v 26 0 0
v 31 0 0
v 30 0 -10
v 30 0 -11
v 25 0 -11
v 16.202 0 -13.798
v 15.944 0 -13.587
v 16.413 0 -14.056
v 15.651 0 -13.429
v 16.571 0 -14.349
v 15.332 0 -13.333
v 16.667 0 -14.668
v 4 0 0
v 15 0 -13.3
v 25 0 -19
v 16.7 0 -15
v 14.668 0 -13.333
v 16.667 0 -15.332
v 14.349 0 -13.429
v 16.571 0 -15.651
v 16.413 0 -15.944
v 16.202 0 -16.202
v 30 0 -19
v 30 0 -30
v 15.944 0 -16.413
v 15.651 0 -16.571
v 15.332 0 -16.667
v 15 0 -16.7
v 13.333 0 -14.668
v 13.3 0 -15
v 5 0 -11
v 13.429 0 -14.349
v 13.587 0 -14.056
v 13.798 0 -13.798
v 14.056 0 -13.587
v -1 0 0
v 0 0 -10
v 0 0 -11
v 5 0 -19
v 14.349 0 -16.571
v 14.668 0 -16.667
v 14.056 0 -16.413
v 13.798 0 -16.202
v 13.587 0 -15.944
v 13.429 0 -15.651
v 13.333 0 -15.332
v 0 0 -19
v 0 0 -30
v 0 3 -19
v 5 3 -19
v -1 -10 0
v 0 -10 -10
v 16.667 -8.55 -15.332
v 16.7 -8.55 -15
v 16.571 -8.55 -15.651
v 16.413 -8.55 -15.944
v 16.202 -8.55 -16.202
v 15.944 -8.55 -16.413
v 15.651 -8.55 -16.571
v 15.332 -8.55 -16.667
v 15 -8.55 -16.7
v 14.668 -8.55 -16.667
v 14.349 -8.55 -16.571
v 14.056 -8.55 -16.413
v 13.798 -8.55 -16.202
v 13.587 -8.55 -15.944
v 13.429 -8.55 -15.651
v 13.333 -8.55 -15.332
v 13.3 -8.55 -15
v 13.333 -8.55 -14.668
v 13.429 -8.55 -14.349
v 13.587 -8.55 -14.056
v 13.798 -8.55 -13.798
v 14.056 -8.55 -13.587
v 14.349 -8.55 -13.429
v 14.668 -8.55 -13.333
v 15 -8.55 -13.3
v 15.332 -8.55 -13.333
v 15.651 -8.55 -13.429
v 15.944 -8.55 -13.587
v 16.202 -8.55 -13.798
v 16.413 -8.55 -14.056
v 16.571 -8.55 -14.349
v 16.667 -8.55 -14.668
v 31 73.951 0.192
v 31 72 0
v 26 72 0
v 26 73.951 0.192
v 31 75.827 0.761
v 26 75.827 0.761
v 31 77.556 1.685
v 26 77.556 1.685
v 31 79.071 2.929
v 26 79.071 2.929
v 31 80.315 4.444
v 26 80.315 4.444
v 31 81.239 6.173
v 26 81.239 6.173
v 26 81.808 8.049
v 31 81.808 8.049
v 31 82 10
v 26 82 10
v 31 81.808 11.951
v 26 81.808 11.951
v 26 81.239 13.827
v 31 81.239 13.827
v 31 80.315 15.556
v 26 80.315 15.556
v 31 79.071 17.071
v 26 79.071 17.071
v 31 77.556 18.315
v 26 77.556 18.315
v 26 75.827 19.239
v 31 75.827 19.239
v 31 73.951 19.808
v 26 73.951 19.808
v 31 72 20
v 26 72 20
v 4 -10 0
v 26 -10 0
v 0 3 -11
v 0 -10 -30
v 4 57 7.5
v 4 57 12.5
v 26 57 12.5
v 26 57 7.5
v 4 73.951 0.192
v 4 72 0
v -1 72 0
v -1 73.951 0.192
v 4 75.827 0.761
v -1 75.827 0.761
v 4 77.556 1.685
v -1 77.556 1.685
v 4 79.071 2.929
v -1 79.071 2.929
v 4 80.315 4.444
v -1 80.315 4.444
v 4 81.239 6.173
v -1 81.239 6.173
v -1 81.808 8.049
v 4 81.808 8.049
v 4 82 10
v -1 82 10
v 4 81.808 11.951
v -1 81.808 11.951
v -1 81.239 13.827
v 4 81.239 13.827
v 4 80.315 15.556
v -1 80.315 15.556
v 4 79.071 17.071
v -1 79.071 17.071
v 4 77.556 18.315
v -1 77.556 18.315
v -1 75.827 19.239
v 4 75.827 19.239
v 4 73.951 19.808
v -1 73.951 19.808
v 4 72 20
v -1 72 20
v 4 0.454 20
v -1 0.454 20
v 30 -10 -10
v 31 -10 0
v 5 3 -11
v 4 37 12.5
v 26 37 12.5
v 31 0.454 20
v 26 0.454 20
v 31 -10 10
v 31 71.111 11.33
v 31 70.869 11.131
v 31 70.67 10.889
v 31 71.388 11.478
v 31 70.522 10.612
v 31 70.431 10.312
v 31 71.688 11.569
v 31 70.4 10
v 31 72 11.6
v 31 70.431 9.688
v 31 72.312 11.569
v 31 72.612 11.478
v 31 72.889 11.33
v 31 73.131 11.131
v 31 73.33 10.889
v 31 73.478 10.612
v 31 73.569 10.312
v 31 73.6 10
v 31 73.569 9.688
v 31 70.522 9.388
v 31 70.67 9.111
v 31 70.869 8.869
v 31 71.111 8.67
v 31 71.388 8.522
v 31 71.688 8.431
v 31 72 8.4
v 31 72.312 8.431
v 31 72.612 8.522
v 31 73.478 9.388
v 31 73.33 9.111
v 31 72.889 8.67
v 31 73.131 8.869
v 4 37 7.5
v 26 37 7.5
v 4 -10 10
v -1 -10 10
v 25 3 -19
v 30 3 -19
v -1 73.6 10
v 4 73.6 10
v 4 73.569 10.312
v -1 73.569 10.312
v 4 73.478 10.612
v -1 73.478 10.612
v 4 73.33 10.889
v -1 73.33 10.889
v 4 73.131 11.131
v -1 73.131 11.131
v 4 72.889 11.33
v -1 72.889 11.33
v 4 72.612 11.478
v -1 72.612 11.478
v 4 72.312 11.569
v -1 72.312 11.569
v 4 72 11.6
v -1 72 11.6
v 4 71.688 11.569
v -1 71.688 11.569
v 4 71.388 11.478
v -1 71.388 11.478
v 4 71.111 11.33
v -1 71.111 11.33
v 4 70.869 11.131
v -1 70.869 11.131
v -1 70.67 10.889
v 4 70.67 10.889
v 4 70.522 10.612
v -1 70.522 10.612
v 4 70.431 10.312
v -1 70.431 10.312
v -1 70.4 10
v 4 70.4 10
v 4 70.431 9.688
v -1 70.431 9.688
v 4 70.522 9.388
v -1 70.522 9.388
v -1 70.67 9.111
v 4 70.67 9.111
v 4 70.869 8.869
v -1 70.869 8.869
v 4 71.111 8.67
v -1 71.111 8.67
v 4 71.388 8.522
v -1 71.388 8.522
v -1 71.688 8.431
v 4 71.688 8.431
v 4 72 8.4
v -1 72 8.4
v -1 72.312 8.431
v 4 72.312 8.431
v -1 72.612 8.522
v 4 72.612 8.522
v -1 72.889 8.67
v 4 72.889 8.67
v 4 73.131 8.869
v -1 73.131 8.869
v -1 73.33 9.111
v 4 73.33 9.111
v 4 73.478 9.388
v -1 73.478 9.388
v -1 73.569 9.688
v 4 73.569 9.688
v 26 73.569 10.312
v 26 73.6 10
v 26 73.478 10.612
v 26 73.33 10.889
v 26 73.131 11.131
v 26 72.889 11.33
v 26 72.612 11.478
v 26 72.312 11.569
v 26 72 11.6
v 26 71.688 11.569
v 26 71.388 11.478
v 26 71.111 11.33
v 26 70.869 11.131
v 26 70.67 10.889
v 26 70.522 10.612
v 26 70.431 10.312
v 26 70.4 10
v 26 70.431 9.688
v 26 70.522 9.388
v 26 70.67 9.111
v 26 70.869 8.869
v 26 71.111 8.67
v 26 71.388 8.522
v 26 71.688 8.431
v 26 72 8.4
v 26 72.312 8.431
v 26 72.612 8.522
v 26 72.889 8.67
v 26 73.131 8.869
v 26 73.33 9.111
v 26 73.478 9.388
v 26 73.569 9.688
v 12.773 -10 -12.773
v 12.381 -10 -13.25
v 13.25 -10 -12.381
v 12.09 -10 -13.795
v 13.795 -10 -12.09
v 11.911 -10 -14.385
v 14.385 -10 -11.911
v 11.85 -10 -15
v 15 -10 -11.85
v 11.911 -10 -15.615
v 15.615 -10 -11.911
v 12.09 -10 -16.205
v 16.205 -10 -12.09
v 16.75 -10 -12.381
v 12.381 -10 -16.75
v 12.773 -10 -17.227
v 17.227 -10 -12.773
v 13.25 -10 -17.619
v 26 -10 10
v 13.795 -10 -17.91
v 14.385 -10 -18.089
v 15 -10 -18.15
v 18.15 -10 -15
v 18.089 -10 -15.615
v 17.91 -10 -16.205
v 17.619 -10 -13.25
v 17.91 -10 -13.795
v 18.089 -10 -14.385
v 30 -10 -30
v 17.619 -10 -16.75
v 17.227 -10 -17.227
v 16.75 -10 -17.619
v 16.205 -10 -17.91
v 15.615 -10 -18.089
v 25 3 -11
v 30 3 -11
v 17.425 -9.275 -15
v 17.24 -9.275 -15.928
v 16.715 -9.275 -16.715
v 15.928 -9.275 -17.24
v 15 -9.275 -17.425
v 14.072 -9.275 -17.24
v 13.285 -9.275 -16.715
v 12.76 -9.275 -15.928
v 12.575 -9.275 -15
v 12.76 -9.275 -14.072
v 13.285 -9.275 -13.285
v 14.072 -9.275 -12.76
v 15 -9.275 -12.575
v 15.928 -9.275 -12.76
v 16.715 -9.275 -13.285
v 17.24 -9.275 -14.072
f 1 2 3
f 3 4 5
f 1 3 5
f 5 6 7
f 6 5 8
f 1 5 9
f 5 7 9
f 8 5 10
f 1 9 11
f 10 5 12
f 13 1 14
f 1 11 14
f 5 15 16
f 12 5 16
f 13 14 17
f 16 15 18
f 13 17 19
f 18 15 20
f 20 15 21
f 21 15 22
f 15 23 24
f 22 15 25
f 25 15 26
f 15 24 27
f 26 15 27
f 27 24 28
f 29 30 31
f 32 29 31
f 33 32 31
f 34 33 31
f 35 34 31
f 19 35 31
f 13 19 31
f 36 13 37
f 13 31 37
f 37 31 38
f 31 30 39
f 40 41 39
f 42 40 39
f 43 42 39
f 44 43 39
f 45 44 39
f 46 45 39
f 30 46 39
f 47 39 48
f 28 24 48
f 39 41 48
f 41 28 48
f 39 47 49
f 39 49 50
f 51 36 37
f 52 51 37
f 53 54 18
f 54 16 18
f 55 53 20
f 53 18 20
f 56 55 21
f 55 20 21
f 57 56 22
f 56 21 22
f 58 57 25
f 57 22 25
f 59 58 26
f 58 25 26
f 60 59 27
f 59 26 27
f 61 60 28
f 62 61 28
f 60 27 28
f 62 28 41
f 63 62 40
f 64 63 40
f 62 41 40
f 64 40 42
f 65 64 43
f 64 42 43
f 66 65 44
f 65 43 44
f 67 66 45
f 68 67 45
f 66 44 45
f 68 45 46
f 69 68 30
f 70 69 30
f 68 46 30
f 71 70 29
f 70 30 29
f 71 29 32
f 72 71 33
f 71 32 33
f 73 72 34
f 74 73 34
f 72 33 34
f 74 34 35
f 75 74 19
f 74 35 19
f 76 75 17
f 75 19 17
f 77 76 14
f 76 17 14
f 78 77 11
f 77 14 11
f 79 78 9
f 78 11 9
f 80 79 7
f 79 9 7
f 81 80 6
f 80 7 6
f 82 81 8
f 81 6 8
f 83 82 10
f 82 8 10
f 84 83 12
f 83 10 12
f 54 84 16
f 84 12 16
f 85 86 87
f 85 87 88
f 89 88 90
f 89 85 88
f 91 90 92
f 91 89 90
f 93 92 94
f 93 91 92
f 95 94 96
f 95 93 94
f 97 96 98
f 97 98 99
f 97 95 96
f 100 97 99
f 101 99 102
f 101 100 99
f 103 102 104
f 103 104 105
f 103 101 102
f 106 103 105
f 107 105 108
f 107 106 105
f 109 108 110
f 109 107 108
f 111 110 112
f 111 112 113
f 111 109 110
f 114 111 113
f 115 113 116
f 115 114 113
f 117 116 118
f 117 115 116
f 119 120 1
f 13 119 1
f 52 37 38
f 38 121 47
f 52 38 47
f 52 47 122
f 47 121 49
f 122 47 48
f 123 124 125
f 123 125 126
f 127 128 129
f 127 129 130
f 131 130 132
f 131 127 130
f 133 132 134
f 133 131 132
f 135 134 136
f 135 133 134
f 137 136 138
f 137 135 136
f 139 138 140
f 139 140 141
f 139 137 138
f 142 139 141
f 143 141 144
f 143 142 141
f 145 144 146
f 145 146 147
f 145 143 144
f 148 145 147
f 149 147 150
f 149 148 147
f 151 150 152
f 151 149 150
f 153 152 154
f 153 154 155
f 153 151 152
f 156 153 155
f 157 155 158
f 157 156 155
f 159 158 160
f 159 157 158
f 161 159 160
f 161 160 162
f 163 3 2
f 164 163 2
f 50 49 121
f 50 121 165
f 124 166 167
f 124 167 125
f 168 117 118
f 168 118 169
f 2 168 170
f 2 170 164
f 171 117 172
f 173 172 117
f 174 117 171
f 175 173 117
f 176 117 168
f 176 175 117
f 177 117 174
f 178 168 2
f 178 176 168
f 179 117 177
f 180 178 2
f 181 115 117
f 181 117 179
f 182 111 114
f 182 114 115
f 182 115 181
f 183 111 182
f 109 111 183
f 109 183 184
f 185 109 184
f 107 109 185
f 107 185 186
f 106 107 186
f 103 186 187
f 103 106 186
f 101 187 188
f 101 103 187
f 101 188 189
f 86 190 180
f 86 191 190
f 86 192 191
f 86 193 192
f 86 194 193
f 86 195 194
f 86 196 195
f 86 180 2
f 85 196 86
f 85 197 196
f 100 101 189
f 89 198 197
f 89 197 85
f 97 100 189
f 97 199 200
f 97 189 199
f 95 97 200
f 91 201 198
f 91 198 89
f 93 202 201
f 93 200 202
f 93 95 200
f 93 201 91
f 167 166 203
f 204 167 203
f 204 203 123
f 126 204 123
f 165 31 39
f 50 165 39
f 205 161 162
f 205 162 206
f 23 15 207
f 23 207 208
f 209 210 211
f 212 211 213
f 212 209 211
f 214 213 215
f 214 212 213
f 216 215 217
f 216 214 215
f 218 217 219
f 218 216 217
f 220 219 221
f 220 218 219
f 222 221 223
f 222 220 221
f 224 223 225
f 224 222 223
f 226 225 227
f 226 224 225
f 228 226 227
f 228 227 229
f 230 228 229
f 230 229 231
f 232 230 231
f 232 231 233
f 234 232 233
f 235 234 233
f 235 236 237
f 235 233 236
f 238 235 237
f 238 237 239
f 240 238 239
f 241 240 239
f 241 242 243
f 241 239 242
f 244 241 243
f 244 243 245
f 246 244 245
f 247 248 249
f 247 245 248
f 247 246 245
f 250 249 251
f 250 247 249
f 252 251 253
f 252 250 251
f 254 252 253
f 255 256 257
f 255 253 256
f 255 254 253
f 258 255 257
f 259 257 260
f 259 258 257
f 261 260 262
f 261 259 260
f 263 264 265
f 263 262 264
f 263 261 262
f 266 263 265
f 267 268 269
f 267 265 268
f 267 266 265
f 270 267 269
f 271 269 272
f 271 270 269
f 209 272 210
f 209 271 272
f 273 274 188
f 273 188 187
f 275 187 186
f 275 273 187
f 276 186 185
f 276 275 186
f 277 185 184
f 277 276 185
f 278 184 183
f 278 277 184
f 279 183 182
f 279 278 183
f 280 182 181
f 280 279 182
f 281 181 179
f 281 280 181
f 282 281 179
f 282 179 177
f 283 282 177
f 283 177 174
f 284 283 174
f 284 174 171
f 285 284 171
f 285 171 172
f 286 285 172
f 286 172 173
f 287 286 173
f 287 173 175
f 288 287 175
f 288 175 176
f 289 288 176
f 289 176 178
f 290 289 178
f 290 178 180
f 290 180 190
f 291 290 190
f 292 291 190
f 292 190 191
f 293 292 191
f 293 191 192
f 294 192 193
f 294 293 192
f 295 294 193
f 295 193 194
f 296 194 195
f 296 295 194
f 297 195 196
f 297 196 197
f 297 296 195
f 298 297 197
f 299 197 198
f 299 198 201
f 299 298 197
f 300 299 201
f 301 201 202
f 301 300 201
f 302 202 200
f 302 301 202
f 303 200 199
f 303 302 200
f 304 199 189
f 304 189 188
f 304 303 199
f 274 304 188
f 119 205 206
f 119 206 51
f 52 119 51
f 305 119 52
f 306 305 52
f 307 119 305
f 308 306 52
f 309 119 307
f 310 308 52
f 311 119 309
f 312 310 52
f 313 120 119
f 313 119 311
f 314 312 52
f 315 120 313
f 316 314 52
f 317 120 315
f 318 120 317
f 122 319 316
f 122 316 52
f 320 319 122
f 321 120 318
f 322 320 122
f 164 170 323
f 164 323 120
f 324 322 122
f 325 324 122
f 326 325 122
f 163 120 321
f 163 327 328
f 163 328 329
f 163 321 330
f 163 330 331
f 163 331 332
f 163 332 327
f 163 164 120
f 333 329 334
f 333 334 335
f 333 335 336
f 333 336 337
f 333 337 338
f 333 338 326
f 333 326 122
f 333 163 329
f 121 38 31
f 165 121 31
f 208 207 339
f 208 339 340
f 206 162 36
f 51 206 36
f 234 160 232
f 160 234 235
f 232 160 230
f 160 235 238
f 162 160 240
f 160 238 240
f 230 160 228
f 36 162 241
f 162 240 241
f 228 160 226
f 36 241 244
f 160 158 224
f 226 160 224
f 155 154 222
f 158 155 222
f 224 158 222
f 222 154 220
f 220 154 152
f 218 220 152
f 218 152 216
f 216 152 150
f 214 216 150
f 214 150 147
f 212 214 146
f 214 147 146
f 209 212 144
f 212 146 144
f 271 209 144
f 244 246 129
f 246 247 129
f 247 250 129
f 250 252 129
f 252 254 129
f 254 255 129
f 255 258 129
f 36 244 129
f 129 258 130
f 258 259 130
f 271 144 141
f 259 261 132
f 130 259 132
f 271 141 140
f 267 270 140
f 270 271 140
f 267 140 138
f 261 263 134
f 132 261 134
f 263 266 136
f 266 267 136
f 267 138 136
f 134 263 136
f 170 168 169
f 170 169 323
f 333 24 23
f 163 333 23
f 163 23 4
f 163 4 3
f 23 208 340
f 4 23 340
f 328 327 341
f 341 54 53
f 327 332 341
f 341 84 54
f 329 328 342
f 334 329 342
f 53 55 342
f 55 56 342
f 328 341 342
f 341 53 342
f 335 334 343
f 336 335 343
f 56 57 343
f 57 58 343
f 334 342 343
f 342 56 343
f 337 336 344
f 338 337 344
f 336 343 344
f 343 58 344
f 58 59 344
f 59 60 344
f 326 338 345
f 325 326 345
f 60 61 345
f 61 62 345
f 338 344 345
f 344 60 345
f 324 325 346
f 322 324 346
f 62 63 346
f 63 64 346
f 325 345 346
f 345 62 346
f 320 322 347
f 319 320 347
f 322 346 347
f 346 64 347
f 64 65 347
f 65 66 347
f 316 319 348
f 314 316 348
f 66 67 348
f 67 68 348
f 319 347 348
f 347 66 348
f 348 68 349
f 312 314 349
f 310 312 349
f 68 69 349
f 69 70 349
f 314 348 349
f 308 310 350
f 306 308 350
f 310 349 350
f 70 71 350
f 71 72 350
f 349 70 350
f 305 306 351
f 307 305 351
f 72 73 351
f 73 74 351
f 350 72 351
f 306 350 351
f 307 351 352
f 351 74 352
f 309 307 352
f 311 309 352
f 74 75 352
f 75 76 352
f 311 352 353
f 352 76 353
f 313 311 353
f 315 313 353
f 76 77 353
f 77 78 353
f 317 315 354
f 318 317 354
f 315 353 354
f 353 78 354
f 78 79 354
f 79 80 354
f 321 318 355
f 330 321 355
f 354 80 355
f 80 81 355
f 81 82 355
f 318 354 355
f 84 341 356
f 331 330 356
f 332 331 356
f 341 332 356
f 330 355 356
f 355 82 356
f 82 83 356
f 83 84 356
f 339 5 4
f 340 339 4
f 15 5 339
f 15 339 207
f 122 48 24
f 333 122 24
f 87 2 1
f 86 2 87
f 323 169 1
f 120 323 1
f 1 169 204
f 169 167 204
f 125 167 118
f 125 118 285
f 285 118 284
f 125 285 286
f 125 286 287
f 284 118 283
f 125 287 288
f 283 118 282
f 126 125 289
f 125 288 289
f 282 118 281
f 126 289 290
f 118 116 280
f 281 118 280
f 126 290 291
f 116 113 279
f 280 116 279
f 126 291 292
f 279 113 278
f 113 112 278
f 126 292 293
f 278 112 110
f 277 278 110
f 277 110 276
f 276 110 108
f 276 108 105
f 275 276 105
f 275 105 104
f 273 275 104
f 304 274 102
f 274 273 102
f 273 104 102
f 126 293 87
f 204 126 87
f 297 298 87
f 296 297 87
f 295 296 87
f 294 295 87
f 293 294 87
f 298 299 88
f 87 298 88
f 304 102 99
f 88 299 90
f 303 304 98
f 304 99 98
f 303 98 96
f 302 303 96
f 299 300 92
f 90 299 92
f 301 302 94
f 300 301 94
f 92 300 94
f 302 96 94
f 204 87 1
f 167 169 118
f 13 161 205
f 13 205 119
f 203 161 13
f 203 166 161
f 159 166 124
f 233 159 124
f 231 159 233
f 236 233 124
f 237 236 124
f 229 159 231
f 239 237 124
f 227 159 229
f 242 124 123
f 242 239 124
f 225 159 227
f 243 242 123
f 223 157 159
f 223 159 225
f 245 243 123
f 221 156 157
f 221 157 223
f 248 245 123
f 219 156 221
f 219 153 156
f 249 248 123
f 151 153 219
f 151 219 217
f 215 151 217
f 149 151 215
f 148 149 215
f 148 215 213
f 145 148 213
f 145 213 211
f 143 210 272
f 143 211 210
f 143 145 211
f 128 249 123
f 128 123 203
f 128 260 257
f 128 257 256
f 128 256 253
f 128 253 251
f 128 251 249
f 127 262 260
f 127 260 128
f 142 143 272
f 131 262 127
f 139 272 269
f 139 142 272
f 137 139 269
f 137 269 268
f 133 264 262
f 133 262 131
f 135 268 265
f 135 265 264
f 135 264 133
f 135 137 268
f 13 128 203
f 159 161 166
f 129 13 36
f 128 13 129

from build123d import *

# Parameters (mm, degrees)
EXTRUDE_1_DEPTH     = 10
SKETCH_4_W          = 5
SKETCH_4_H          = 8
EXTRUDE_3_DEPTH     = 3
EXTRUDE_4_DEPTH     = 16
CUT_EXTRUDE_1_DEPTH = 11
SKETCH_15_W         = 5
SKETCH_15_H         = 20
EXTRUDE_5_DEPTH     = 22
OTHER_START         = -1
OTHER_4_OUTLINE_R   = 1.6
OTHER_4_DEPTH       = 32


# Read off the part's stored shape, not the designer's step: 高级异型孔3, 高级异型孔4
with BuildPart() as part:
    # 草图1 → 凸台-拉伸1 (new body)
    with BuildSketch(Plane(origin=(0, 0, 0), x_dir=(1, 0, 0), z_dir=(0, 1, 0))):
        Polygon((0, 10), (0, 30), (30, 30), (30, 10), (31, 0), (30, 0), (0, 0), (-1, 0), align=None)
    extrude(amount=-EXTRUDE_1_DEPTH)

    # 草图4 → 凸台-拉伸3 (add)
    with BuildSketch(Plane(origin=(0, 0, 0), x_dir=(1, 0, 0), z_dir=(0, 1, 0))):
        with Locations((2.5, 15)):
            Rectangle(SKETCH_4_W, SKETCH_4_H)
        with Locations((27.5, 15)):
            Rectangle(SKETCH_4_W, SKETCH_4_H)
    extrude(amount=EXTRUDE_3_DEPTH)

    # 高级异型孔3 outline → 高级异型孔3 (revolve, cut)
    with BuildSketch(Plane(origin=(15, 0, -15), x_dir=(1, 0, 0), z_dir=(0, 0, 1))):
        Polygon((0, -10), (3.15, -10), (1.7, -8.55), (1.7, 0), (0, 0), align=None)
    revolve(axis=Axis((15, 0, -15), (0, 1, 0)), mode=Mode.SUBTRACT)

    # 草图13 → 凸台-拉伸4 (add, symmetric)
    with BuildSketch(Plane(origin=(15, 0, 0), x_dir=(0, 0, -1), z_dir=(1, 0, 0))):
        with BuildLine():
            Line((0, -10), (0, 15))
            Line((0, 15), (0, 72))
            ThreePointArc((0, 72), (-10, 82), (-20, 72))
            Line((-20, 72), (-20, 10.908419296))
            Line((-20, 10.908419296), (-20, 0.454209648))
            Line((-20, 0.454209648), (-10, -10))
            Line((-10, -10), (0, -10))
        make_face()
    extrude(amount=EXTRUDE_4_DEPTH, both=True)

    # 草图13<2> → 切除-拉伸1 (cut, symmetric)
    with BuildSketch(Plane(origin=(15, 0, 0), x_dir=(0, 0, -1), z_dir=(1, 0, 0))):
        with BuildLine():
            Line((0, -10), (0, 15))
            Line((0, 15), (0, 72))
            ThreePointArc((0, 72), (-10, 82), (-20, 72))
            Line((-20, 72), (-20, 10.908419296))
            Line((-20, 10.908419296), (-20, 0.454209648))
            Line((-20, 0.454209648), (-10, -10))
            Line((-10, -10), (0, -10))
        make_face()
    extrude(amount=CUT_EXTRUDE_1_DEPTH, both=True, mode=Mode.SUBTRACT)

    # 草图15 → 凸台-拉伸5 (add)
    with BuildSketch(Plane(origin=(4, 0, 0), x_dir=(0, 0, -1), z_dir=(1, 0, 0))):
        with Locations((-10, 47)):
            Rectangle(SKETCH_15_W, SKETCH_15_H)
    extrude(amount=EXTRUDE_5_DEPTH)

    # 高级异型孔4 outline → 高级异型孔4 (cut)
    with BuildSketch(Plane.YZ.offset(OTHER_START)):
        with Locations((72, 10)):
            Circle(OTHER_4_OUTLINE_R)
    extrude(amount=OTHER_4_DEPTH, mode=Mode.SUBTRACT)


solid = part.part
